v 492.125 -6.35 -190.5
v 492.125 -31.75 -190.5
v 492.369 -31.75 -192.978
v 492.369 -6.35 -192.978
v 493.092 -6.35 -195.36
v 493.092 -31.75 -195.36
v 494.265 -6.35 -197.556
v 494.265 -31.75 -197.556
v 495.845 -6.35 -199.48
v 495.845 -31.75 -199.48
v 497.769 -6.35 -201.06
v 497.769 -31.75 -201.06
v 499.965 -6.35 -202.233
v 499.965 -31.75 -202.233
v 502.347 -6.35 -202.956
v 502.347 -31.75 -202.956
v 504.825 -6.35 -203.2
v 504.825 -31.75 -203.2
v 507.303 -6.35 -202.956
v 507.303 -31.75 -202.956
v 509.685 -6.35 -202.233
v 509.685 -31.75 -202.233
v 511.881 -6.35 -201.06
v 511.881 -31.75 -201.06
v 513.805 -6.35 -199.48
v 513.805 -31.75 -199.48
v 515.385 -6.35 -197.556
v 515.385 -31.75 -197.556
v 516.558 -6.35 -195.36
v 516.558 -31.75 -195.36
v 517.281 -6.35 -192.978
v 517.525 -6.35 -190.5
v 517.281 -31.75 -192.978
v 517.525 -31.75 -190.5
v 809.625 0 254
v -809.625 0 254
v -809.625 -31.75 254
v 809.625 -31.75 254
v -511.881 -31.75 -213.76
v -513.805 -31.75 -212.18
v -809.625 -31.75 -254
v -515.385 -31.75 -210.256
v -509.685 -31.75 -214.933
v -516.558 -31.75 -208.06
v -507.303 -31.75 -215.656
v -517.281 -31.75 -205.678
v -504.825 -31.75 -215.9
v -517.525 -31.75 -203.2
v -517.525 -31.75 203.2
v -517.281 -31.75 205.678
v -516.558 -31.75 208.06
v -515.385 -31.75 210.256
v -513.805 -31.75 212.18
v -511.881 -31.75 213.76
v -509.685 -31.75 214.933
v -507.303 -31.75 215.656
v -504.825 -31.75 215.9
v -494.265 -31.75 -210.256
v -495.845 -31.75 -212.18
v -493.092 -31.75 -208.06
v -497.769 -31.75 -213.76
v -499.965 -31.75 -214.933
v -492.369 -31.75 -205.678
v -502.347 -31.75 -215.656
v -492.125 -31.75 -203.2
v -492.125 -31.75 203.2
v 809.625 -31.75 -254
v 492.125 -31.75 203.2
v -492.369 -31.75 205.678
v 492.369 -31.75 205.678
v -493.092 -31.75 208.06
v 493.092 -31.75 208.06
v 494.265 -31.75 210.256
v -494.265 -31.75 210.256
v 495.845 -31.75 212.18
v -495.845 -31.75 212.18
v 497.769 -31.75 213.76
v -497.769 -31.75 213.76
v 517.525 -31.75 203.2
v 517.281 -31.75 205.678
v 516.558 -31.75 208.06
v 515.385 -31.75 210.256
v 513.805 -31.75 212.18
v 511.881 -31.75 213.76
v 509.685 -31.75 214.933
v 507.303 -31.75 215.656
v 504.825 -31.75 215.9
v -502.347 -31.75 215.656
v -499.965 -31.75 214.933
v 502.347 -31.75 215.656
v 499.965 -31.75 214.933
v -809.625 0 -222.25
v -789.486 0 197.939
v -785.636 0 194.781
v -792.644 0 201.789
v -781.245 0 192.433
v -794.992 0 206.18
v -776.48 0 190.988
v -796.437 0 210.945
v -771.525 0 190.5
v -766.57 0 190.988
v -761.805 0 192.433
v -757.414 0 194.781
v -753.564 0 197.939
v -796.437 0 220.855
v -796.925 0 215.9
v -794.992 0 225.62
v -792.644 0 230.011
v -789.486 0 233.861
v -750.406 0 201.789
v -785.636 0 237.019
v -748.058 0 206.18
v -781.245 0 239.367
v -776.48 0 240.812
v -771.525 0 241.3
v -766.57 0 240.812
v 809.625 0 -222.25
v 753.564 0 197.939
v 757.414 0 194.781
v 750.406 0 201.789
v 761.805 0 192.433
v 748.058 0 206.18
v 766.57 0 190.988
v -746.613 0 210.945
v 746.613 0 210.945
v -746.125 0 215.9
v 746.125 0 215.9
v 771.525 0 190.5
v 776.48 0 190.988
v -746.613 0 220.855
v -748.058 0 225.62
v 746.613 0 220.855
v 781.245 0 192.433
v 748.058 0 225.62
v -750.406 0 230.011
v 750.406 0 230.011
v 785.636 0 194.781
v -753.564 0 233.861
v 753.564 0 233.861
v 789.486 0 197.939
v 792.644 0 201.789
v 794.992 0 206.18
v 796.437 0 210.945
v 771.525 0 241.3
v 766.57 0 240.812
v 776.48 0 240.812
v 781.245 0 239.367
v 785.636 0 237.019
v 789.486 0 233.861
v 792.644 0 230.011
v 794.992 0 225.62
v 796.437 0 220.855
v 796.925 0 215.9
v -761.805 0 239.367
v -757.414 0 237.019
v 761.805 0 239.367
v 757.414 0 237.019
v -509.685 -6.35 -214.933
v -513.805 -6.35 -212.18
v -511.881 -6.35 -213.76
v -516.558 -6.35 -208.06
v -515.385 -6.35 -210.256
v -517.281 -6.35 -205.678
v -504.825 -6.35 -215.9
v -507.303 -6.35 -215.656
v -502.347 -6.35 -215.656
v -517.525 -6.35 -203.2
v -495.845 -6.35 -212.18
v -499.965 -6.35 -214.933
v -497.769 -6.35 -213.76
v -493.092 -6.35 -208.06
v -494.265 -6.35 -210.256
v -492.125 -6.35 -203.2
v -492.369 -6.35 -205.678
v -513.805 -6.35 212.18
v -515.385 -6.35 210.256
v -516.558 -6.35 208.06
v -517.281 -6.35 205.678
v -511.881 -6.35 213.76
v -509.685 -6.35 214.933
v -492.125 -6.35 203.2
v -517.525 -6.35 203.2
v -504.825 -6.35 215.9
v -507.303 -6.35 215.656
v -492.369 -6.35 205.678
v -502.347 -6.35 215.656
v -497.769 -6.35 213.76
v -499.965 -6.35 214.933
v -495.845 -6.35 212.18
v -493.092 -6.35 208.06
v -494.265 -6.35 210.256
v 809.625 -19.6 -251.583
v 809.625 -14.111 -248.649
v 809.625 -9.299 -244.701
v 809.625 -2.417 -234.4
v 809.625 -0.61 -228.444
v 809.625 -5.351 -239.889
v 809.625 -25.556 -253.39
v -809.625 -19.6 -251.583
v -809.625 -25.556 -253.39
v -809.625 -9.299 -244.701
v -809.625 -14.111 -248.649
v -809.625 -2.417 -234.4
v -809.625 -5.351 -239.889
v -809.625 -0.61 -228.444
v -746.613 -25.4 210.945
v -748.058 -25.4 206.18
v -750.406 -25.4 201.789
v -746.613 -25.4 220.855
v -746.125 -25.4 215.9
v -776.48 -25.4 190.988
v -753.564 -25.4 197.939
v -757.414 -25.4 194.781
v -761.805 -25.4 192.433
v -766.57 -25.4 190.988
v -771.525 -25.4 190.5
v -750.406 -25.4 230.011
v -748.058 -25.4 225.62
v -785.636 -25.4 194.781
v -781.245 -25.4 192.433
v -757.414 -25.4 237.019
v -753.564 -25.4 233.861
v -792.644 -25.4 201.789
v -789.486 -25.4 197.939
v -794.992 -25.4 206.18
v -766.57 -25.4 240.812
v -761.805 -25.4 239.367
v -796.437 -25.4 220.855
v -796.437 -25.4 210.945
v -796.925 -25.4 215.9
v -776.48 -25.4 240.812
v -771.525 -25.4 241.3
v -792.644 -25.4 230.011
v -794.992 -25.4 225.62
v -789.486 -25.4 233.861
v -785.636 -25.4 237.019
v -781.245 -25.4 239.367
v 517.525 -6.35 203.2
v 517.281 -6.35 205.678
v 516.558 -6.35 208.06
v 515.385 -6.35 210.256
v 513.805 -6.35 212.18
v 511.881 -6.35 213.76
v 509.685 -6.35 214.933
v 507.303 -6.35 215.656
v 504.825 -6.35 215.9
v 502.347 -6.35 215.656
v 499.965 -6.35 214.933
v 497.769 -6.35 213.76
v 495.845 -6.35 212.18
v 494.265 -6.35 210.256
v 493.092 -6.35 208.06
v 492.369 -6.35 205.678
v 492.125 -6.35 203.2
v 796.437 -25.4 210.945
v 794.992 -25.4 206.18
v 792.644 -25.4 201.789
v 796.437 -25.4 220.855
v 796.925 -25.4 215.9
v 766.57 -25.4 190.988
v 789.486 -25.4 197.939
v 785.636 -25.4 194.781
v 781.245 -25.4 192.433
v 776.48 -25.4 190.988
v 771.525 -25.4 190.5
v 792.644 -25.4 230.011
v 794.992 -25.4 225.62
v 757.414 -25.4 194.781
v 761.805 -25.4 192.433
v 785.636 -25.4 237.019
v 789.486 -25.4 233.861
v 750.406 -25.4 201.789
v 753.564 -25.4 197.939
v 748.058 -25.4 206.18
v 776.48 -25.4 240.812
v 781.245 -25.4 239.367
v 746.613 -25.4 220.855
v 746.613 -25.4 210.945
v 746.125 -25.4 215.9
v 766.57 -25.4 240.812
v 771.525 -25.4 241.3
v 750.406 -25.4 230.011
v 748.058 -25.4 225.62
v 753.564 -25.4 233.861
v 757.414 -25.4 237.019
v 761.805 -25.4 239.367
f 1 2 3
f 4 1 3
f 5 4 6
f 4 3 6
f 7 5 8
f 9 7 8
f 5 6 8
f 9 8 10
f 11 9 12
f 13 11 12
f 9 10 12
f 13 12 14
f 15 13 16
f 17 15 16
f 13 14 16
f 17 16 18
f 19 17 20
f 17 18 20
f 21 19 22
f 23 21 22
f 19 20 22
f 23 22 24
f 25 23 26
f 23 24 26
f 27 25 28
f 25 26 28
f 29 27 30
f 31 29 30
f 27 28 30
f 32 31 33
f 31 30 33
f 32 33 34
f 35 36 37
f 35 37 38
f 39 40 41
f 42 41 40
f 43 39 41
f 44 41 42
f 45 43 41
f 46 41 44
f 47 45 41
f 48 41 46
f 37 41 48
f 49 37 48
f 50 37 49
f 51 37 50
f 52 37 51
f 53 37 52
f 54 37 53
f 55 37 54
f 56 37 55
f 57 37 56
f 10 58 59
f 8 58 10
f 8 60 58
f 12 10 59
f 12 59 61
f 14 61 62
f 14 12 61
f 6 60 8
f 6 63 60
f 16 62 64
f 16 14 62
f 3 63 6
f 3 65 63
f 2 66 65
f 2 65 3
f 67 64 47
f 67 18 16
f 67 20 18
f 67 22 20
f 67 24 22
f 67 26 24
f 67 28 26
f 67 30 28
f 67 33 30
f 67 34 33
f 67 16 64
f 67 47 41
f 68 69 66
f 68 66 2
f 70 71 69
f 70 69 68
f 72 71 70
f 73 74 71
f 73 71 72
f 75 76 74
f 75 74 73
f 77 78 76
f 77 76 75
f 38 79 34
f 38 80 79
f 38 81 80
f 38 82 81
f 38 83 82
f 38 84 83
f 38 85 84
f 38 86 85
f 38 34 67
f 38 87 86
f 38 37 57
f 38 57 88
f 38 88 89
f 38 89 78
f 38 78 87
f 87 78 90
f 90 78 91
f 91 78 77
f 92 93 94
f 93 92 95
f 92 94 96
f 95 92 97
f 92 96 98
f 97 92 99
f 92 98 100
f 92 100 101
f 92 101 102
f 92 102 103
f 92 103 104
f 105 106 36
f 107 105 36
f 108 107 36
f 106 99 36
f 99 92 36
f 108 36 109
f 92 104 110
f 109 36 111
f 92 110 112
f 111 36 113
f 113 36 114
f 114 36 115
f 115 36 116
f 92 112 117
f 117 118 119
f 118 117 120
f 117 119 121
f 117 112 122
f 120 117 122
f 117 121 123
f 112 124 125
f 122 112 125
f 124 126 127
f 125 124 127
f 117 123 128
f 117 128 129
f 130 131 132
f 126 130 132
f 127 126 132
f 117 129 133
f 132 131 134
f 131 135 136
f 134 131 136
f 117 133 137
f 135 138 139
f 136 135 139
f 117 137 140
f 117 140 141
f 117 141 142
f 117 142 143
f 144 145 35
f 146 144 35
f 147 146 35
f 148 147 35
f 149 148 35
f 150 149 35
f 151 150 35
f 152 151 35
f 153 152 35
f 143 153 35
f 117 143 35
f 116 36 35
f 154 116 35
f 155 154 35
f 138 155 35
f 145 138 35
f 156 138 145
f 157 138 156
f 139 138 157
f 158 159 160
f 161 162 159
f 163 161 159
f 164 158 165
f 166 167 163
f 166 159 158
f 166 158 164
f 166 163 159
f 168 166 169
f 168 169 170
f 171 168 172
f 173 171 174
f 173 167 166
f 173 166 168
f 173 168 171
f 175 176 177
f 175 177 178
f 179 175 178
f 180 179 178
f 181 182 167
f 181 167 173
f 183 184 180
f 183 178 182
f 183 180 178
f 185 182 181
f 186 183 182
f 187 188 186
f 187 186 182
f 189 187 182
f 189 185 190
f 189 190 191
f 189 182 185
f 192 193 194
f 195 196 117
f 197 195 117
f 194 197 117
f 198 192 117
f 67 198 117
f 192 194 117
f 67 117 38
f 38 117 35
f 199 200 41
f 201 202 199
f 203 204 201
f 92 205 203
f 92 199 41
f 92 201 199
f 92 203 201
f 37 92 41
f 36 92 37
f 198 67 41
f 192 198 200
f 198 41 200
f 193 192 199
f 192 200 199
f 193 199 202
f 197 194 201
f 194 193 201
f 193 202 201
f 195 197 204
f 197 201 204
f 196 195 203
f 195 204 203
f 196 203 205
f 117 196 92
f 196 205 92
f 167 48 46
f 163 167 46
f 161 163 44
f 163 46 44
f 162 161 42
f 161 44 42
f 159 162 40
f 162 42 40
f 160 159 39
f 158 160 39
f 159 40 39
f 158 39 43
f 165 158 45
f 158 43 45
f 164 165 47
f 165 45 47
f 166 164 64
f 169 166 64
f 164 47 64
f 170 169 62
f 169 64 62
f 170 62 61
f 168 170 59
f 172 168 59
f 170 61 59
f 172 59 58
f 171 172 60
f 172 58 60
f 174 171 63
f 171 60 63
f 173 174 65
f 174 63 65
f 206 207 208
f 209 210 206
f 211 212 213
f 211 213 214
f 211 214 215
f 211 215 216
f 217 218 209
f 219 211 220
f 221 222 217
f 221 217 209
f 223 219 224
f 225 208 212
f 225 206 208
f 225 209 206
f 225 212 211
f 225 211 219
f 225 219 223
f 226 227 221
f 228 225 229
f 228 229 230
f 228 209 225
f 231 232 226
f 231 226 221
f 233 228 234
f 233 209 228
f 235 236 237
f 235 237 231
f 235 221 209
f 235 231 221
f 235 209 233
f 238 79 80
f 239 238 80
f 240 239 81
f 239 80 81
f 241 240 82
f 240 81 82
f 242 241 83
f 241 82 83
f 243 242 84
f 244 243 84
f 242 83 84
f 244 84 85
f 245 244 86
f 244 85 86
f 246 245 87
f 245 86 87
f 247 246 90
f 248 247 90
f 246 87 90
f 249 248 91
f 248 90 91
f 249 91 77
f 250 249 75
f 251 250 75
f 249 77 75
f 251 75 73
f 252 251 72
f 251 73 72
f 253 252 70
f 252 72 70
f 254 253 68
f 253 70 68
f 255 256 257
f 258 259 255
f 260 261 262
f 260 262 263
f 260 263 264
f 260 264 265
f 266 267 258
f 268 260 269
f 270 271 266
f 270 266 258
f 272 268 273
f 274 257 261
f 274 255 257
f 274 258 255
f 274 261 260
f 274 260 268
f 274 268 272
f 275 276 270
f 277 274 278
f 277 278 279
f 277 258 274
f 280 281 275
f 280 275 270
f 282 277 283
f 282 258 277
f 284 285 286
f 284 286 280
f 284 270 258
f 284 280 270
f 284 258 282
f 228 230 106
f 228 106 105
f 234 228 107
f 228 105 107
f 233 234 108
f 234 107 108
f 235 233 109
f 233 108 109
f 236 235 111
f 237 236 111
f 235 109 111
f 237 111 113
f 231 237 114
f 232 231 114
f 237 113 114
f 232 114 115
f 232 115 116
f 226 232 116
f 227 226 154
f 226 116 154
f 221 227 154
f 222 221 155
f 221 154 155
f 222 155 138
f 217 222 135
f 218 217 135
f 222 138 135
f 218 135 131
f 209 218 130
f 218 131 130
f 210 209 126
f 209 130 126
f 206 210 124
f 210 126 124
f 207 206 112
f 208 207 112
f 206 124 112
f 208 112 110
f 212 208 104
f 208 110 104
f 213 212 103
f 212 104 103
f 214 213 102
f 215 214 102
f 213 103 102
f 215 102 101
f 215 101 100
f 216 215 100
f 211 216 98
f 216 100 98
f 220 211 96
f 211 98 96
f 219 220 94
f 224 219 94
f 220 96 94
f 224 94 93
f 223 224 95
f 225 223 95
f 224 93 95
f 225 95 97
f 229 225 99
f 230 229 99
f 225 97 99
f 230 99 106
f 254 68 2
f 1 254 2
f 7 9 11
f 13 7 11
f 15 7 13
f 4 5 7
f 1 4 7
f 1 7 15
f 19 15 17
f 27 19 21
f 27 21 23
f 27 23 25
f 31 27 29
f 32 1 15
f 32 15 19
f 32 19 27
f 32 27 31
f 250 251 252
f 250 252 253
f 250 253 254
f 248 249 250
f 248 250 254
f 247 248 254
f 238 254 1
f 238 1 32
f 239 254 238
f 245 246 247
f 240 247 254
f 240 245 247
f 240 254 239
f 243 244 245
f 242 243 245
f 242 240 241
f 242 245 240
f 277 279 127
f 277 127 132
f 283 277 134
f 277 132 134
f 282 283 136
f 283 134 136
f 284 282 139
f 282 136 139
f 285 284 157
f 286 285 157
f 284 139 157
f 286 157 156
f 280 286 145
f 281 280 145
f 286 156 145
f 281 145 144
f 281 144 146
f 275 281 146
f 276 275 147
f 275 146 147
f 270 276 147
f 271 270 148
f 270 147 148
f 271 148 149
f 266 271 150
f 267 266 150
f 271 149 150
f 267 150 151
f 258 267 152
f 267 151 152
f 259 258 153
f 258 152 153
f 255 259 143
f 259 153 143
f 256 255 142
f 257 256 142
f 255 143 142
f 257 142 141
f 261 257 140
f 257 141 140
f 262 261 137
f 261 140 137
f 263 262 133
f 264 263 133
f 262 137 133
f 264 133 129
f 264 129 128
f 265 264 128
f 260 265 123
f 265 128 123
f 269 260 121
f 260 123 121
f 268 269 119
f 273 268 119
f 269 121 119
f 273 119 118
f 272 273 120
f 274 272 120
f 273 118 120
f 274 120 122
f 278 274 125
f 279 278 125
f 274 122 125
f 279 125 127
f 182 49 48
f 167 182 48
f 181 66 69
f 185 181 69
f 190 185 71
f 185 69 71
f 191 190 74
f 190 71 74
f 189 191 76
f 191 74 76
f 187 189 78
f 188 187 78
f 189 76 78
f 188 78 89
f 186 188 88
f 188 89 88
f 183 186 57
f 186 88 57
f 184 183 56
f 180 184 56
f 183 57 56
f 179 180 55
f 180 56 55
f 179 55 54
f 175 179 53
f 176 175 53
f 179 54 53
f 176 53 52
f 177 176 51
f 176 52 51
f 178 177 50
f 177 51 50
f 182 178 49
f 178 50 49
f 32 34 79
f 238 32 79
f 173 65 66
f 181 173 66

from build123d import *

# Parameters (mm, degrees)
F0_W     = 1619.25
F0_H     = 508
F1_DEPTH = 31.75
F3_DEPTH = 1619.251
F5_DEPTH = 25.4
F6_R     = 25.4
F7_DEPTH = 25.4


with BuildPart() as f1:
    # F0 (on Front) → F1 (new body)
    with BuildSketch(Plane.XZ):
        Rectangle(F0_W, F0_H)
    extrude(amount=F1_DEPTH)

    # F2 (on face) → F3 (cut, through all)
    with BuildSketch(Plane(origin=(-809.625, 0, 0), x_dir=(0, -1, 0), z_dir=(-1, 0, 0))):
        with BuildLine():
            Line((0, -222.25), (0, -254))
            Line((0, -254), (31.75, -254))
            ThreePointArc((31.75, -254), (9.29936, -244.70064), (0, -222.25))
        make_face()
    extrude(amount=-F3_DEPTH, mode=Mode.SUBTRACT)

    # F4 (on face) → F5 (cut)
    with BuildSketch(Plane.XZ.offset(31.75)):
        with BuildLine():
            Line((-492.125, -203.2), (-492.125, 203.2))
            ThreePointArc((-492.125, 203.2), (-504.825, 215.9), (-517.525, 203.2))
            Line((-517.525, 203.2), (-517.525, -203.2))
            ThreePointArc((-517.525, -203.2), (-504.825, -215.9), (-492.125, -203.2))
        make_face()
        with BuildLine():
            Line((517.525, -190.5), (517.525, 203.2))
            ThreePointArc((517.525, 203.2), (504.825, 215.9), (492.125, 203.2))
            Line((492.125, 203.2), (492.125, -190.5))
            ThreePointArc((492.125, -190.5), (504.825, -203.2), (517.525, -190.5))
        make_face()
    extrude(amount=-F5_DEPTH, mode=Mode.SUBTRACT)

    # F6 (on face) → F7 (cut)
    with BuildSketch(Plane(origin=(0, 0, 0), x_dir=(-1, 0, 0), z_dir=(0, 1, 0))):
        with Locations((-771.525, 215.9)):
            Circle(F6_R)
        with Locations((771.525, 215.9)):
            Circle(F6_R)
    extrude(amount=-F7_DEPTH, mode=Mode.SUBTRACT)


solid = f1.part
